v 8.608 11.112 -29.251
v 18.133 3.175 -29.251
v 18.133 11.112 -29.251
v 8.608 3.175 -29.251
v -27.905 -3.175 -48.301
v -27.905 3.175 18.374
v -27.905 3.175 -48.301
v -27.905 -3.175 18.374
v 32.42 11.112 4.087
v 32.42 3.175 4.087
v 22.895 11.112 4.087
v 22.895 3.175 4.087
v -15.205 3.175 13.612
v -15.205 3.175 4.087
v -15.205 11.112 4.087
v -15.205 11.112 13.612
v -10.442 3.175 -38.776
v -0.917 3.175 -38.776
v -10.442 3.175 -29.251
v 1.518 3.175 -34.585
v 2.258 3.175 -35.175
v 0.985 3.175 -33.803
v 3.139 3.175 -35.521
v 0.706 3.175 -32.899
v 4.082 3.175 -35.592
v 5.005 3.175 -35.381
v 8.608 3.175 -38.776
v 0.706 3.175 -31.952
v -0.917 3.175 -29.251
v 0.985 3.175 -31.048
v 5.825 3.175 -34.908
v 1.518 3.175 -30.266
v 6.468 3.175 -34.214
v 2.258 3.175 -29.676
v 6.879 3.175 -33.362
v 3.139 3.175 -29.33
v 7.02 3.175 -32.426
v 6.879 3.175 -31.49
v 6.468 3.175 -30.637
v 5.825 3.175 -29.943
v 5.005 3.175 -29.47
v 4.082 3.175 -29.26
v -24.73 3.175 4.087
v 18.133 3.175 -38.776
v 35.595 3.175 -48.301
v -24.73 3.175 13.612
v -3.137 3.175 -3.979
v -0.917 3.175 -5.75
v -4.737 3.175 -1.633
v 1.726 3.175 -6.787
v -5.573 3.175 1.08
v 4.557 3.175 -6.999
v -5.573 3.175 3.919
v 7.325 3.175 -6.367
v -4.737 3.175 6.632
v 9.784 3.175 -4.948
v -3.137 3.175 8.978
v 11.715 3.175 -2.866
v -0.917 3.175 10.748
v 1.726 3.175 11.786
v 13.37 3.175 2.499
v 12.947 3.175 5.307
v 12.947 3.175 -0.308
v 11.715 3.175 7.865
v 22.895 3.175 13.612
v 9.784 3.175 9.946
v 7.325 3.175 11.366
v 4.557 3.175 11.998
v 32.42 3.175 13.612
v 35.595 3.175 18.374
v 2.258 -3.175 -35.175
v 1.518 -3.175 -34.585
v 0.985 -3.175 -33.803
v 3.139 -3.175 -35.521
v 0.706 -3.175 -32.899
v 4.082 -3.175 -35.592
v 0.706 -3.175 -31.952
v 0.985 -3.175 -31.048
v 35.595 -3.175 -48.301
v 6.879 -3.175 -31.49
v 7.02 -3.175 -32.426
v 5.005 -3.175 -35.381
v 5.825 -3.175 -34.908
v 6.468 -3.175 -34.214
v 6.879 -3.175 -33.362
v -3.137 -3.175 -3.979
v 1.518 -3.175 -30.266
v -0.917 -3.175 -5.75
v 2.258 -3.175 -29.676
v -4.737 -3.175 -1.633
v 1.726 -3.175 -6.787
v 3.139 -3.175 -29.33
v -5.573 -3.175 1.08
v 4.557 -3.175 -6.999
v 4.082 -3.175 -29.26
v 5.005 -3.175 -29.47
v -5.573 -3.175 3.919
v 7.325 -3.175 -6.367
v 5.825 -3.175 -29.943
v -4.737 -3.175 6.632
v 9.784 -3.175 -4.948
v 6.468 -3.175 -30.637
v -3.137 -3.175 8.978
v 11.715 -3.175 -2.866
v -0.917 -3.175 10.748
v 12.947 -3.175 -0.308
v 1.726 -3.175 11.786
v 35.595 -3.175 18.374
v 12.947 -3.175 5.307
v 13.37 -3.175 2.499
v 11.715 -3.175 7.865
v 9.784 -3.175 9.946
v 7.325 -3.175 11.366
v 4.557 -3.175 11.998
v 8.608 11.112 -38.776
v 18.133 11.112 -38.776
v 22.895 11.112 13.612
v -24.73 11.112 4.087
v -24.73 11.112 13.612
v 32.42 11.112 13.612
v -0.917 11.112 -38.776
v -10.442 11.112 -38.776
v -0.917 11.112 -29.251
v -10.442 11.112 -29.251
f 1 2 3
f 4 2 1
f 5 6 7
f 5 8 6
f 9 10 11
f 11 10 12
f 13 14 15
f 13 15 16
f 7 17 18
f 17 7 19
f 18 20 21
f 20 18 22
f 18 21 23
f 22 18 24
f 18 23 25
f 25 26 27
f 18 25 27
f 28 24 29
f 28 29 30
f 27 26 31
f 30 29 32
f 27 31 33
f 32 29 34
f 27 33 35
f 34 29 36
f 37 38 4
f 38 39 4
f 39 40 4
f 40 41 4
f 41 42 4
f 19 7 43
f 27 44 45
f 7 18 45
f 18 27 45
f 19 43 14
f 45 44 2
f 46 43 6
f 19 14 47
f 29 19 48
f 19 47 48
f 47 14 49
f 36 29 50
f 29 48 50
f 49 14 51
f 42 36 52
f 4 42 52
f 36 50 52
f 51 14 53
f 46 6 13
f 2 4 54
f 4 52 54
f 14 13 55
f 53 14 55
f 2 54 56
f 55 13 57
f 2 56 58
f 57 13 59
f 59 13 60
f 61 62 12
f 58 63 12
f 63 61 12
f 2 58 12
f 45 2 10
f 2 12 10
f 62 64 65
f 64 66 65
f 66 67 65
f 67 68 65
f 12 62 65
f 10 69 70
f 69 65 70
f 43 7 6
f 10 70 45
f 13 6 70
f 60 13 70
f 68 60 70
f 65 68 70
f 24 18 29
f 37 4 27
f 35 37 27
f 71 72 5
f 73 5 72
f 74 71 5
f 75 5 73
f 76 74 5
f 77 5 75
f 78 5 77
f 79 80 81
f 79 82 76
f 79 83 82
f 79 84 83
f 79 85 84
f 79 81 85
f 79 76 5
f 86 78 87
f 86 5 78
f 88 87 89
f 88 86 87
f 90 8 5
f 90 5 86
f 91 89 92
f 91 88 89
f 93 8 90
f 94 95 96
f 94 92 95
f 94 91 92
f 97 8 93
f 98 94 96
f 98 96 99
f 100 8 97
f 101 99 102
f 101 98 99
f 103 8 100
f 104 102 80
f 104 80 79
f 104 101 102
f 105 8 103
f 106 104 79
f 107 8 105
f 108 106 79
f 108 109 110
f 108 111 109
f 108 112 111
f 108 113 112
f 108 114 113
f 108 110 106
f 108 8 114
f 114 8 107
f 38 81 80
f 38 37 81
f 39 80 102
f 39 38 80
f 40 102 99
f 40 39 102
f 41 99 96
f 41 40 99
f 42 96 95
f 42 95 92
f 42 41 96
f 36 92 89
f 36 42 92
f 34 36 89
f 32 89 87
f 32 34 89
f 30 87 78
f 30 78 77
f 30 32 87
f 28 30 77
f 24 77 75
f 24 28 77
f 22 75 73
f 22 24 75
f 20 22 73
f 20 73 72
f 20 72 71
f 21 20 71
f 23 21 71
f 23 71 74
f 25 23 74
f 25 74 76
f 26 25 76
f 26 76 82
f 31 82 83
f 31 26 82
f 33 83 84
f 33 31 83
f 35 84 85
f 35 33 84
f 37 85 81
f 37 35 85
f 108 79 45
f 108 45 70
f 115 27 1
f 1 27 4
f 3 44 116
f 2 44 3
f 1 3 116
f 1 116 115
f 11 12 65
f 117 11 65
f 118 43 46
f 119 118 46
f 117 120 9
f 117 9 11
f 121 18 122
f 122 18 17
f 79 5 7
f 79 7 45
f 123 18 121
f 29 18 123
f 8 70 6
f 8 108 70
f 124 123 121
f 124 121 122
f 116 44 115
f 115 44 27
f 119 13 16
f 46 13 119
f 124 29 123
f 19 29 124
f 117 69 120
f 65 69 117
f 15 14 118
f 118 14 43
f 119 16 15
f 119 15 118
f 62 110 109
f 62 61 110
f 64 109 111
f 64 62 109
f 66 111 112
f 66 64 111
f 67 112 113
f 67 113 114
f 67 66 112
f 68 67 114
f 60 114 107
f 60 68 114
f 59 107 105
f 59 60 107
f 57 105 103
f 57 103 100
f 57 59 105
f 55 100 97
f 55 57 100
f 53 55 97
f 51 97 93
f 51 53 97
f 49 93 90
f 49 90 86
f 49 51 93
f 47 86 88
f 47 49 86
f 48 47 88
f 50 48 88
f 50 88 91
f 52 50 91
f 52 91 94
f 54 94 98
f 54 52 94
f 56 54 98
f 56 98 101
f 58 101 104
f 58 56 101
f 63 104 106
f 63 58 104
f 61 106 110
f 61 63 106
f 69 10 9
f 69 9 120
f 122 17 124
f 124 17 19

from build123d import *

# Parameters (mm, degrees)
F0_W     = 17.4625
F0_H     = 63.5
F0_R     = 3.175
F0_R_2   = 9.525
F0_W_2   = 21.1666666667
F0_H_2   = 3.175
F1_DEPTH = 3.175
F2_W     = 9.525
F2_H     = 9.525
F3_DEPTH = 7.9375


with BuildPart() as f1:
    # F0 (on Front) → F1 (new body, symmetric)
    with BuildSketch(Plane.XZ):
        Polygon((-10.4423522066, -45.1256732441), (-27.9048522066, -45.1256732441), (-27.9048522066, -48.3006732441), (-6.7381855399, -48.3006732441), (-6.7381855399, -45.1256732441), align=None)
        Polygon((35.5951477934, -45.1256732441), (18.1326477934, -45.1256732441), (14.4284811268, -45.1256732441), (14.4284811268, -48.3006732441), (35.5951477934, -48.3006732441), align=None)
        with Locations((-19.1736022066, -13.3756732441)):
            Rectangle(F0_W, F0_H)
        Polygon((18.1326477934, 18.3743267559), (-10.4423522066, 18.3743267559), (-10.4423522066, -45.1256732441), (-6.7381855399, -45.1256732441), (14.4284811268, -45.1256732441), (18.1326477934, -45.1256732441), align=None)
        with Locations((3.8451477934, -32.4256732441)):
            Circle(F0_R, mode=Mode.SUBTRACT)
        with Locations((3.8451477934, 2.4993267559)):
            Circle(F0_R_2, mode=Mode.SUBTRACT)
        with Locations((26.8638977934, -13.3756732441)):
            Rectangle(F0_W, F0_H)
        with Locations((3.8451477934, -46.7131732441)):
            Rectangle(F0_W_2, F0_H_2)
    extrude(amount=F1_DEPTH, both=True)

    # F2 (on face) → F3 (join)
    with BuildSketch(Plane(origin=(0, 3.175, 0), x_dir=(-1, 0, 0), z_dir=(0, 1, 0))):
        with Locations((19.9673522066, 8.8493267559)):
            Rectangle(F2_W, F2_H)
        with Locations((-27.6576477934, 8.8493267559)):
            Rectangle(F2_W, F2_H)
        with Locations((-13.3701477934, -34.0131732441)):
            Rectangle(F2_W, F2_H)
        with Locations((5.6798522066, -34.0131732441)):
            Rectangle(F2_W, F2_H)
    extrude(amount=F3_DEPTH)


solid = f1.part
